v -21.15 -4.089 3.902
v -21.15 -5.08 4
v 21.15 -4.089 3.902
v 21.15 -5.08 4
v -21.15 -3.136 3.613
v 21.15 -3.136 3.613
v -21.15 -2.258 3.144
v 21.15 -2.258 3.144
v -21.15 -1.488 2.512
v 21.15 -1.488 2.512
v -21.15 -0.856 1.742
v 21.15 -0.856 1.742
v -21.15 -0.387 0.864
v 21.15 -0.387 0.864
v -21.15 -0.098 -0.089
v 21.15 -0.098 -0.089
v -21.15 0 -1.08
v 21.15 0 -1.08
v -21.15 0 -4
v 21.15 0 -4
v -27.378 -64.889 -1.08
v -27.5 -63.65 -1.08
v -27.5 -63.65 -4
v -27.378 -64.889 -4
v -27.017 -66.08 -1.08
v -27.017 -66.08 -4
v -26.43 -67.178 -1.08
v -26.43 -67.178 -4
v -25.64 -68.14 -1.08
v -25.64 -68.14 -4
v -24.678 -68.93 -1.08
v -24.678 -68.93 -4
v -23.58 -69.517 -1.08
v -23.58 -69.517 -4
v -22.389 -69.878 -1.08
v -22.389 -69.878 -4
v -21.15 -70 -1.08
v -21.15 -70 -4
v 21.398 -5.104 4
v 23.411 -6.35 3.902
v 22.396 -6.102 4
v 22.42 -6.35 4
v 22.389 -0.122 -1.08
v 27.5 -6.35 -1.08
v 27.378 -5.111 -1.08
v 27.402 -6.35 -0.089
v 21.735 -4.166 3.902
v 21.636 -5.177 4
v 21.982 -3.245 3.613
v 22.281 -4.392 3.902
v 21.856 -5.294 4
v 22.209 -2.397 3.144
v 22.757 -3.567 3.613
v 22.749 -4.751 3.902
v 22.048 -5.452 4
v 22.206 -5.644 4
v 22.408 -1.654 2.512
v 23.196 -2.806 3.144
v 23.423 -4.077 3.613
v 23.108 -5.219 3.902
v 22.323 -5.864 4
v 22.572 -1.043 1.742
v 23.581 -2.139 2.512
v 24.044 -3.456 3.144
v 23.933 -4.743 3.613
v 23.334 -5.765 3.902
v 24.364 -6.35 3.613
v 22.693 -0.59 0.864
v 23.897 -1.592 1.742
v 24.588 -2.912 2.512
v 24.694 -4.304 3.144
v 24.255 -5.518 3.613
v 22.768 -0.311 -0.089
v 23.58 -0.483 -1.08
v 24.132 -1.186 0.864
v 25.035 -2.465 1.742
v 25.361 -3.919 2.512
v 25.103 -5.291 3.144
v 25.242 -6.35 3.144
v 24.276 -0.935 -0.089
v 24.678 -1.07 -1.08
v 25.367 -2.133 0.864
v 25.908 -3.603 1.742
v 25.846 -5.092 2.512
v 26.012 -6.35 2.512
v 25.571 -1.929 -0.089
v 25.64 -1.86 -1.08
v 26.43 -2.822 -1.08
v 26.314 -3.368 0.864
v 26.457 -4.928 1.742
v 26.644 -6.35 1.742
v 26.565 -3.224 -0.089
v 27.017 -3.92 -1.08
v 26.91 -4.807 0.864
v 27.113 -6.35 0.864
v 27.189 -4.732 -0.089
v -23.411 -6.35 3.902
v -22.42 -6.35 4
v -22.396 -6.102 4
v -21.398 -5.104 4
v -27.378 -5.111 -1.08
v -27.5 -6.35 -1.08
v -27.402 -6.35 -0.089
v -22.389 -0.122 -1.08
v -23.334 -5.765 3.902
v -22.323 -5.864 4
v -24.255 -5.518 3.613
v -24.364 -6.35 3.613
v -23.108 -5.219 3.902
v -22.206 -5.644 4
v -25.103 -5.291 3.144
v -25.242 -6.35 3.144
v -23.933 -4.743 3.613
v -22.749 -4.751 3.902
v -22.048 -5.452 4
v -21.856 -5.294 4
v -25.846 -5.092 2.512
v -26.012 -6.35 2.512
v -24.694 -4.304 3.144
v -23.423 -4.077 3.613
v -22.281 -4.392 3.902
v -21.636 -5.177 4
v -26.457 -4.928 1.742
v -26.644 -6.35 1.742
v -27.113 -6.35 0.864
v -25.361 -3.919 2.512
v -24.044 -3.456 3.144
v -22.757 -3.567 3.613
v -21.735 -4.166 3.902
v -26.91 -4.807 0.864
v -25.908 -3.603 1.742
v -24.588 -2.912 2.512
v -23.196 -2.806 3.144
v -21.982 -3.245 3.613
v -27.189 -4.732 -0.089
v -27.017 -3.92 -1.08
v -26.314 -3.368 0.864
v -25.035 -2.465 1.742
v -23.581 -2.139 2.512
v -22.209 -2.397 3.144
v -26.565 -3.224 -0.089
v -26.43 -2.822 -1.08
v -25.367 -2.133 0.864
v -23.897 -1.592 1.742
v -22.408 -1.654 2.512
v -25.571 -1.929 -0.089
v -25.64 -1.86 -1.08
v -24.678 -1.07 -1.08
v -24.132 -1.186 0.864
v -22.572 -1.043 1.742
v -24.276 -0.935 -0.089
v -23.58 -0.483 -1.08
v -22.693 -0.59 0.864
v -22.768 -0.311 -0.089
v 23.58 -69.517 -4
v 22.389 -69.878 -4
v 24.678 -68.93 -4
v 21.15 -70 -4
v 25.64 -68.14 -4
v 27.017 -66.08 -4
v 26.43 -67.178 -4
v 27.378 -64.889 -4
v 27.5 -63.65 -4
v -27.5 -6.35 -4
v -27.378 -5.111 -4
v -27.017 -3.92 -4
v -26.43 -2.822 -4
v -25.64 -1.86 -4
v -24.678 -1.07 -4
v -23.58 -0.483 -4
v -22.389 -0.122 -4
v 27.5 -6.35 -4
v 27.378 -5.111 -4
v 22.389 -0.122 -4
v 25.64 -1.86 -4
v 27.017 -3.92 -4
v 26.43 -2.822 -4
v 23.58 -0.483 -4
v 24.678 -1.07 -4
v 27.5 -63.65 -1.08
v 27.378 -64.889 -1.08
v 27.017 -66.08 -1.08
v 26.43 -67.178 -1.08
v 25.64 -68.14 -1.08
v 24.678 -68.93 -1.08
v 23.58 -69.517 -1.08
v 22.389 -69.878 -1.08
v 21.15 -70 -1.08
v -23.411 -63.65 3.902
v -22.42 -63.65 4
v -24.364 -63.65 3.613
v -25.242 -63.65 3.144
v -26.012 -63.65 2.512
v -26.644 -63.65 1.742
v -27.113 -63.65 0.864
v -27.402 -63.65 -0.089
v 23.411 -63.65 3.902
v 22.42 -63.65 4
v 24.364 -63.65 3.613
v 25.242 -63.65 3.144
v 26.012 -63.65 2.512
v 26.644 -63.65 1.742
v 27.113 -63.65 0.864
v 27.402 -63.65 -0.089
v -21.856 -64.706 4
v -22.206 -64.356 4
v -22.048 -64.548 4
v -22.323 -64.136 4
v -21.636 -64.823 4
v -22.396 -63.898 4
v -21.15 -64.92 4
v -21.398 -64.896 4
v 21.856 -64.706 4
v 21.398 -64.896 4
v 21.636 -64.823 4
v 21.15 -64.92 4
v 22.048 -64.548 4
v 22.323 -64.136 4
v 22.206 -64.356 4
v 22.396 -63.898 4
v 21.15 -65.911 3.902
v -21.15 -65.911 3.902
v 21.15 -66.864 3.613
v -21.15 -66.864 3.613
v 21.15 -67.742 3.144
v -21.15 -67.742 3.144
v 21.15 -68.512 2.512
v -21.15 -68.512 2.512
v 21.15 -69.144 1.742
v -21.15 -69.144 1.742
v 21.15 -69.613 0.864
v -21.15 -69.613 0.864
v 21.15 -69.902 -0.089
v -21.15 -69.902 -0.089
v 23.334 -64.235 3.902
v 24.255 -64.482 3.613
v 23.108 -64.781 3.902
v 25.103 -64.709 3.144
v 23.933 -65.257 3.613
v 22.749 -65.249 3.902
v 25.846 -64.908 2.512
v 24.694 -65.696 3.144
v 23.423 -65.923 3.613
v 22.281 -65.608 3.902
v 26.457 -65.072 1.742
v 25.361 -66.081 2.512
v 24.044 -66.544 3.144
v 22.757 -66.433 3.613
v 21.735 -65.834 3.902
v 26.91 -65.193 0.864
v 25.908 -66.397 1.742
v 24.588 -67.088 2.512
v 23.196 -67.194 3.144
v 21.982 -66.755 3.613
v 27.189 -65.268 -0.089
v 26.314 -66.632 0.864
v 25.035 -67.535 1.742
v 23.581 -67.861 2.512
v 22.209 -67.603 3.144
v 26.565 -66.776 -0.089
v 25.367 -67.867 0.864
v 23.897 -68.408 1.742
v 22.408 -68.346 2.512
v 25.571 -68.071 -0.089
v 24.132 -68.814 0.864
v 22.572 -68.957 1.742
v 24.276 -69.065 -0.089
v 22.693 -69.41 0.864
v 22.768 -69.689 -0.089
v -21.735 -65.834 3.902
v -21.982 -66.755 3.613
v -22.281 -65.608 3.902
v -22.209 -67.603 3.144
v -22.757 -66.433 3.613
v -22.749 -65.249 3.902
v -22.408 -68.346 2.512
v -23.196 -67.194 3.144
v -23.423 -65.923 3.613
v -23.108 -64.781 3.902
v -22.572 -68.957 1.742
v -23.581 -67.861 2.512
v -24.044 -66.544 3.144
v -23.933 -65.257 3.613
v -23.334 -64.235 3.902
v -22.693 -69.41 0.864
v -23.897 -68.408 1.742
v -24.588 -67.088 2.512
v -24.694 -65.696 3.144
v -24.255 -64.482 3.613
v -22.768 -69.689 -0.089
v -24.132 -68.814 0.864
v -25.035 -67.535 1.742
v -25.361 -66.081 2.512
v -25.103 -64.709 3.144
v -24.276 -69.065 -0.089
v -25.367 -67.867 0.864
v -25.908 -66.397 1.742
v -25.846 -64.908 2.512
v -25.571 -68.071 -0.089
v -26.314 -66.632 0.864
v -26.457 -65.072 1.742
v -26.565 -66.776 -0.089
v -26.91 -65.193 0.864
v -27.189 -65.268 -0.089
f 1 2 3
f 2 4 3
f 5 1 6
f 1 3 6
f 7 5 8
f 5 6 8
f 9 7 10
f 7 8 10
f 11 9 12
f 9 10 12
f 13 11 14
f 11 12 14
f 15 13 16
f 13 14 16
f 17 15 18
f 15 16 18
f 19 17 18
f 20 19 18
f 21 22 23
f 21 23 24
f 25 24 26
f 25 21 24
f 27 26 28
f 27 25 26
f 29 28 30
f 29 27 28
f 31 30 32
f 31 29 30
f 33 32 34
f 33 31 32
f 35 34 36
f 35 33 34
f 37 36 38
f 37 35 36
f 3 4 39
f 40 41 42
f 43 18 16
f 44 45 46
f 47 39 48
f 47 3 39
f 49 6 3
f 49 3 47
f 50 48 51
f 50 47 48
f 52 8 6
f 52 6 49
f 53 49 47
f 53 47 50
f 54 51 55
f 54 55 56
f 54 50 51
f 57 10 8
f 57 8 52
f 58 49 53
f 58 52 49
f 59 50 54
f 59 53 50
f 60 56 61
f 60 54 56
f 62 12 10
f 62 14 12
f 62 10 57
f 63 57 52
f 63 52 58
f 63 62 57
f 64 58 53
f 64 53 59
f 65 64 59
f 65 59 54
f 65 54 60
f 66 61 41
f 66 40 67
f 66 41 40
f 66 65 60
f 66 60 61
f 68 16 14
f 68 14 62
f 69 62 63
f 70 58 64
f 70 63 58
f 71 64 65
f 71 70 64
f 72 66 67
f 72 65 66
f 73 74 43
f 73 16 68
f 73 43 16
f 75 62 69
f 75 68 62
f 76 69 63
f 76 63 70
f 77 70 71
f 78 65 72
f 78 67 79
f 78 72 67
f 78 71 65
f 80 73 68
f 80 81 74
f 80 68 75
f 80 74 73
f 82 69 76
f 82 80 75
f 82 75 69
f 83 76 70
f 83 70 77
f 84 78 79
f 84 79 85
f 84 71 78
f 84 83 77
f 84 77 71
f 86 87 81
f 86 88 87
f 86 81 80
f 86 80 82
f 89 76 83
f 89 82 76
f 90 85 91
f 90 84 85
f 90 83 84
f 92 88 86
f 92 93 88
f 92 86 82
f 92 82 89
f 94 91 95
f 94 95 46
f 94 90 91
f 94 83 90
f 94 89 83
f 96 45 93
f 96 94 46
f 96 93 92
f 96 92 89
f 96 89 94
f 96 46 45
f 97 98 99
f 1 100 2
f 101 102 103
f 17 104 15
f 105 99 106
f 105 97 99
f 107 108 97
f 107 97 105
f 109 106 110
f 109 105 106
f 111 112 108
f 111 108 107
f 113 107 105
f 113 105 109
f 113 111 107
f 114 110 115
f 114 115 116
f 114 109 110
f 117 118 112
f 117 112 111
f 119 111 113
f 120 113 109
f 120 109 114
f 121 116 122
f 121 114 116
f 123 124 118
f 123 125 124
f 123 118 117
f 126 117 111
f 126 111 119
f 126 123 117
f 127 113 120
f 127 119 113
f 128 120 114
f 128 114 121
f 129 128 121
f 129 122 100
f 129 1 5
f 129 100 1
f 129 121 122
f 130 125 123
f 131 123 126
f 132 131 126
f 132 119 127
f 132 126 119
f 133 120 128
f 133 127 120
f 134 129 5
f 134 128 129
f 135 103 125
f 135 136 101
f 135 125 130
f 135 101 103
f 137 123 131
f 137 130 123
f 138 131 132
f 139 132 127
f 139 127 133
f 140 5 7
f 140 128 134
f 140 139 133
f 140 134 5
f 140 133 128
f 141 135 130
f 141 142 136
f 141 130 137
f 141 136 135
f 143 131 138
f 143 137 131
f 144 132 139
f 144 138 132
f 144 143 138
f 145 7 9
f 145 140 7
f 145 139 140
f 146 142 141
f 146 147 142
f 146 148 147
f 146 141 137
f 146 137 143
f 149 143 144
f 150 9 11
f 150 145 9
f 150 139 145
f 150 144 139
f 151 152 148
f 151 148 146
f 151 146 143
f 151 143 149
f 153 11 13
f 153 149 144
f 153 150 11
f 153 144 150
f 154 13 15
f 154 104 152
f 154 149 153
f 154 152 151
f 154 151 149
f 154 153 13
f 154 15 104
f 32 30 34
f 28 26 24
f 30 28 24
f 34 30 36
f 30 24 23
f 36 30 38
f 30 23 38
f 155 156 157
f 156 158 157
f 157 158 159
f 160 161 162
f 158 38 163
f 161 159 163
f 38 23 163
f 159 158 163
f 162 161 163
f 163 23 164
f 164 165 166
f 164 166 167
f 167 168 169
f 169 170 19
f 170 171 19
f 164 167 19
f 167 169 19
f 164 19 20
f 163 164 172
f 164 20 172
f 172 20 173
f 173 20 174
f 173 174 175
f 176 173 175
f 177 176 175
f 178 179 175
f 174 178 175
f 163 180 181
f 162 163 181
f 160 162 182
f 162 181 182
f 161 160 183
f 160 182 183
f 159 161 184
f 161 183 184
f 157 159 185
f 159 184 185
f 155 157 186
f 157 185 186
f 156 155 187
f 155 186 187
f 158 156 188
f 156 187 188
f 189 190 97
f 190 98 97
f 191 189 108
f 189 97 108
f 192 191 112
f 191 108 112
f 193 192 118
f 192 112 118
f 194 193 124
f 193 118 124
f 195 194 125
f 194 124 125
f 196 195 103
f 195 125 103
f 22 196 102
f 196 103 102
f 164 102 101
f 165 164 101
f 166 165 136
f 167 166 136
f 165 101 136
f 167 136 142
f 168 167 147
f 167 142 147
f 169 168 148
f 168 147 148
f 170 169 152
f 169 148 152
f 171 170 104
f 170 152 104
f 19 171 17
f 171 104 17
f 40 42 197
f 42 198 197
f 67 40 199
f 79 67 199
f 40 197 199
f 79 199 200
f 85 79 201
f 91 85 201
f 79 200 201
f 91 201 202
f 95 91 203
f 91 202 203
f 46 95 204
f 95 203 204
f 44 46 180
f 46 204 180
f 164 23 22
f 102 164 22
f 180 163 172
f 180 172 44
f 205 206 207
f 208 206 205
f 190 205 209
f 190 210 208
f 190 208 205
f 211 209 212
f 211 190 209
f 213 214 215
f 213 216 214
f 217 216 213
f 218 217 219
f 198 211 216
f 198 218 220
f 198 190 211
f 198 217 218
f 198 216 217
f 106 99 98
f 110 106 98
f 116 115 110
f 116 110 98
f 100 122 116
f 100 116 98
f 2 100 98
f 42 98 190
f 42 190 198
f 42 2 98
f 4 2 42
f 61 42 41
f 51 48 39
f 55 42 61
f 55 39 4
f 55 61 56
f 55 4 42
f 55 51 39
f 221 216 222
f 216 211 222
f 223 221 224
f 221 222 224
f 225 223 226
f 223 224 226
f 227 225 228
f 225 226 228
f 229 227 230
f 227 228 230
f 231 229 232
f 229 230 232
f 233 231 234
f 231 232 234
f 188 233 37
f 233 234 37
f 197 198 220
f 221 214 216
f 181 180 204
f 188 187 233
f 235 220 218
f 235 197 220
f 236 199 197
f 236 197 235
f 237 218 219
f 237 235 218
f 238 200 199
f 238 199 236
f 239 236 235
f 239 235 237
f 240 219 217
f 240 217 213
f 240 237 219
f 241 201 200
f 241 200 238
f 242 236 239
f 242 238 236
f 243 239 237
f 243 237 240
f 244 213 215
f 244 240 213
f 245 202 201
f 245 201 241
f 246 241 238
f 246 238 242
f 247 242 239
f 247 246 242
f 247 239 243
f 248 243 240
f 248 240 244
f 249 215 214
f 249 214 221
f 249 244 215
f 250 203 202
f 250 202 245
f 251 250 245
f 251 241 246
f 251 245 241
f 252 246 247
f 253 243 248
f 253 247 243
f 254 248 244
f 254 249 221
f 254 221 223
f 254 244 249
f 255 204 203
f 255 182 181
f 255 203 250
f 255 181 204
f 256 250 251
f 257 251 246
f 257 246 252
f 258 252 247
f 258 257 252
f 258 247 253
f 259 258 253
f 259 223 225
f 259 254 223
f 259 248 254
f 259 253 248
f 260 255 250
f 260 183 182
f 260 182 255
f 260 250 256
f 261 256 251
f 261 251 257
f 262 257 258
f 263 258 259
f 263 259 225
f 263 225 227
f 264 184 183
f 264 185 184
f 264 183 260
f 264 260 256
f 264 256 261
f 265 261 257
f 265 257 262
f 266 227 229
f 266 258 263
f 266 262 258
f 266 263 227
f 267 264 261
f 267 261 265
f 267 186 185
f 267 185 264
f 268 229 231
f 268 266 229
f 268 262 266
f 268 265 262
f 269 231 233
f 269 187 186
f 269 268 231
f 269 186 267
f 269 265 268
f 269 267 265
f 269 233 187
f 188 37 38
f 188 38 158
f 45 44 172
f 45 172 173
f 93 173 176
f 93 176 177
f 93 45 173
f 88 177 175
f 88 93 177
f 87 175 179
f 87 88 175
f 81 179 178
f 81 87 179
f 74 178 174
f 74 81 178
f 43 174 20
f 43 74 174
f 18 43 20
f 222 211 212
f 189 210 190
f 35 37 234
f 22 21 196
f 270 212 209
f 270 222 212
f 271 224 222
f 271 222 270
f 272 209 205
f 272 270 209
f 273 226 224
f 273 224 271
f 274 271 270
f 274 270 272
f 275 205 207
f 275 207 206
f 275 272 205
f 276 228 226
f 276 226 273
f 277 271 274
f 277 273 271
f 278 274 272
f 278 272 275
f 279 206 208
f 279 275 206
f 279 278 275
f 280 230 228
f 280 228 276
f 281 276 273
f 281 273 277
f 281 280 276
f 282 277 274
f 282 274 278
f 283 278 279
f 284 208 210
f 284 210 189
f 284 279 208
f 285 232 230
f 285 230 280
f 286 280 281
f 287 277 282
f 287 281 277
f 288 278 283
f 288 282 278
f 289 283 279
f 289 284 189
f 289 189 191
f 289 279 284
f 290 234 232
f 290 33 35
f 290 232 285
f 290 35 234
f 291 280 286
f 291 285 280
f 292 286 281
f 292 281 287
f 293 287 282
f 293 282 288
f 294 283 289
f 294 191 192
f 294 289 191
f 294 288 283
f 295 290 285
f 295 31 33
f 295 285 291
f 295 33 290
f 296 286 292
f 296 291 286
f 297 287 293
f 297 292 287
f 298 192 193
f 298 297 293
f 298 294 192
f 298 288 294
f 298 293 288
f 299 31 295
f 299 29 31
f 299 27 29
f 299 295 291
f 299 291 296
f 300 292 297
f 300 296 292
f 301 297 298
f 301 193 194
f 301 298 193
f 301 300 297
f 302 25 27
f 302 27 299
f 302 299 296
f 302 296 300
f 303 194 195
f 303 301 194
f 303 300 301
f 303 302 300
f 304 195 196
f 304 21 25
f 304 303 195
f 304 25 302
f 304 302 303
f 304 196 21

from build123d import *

# Parameters (mm, degrees)
F0_W     = 55
F0_H     = 8
F1_DEPTH = 70
F2_R     = 6.35
F3_R     = 5.08


with BuildPart() as f1:
    # F0 (on Front) → F1 (new body)
    with BuildSketch(Plane.XZ):
        Rectangle(F0_W, F0_H)
    extrude(amount=F1_DEPTH)

    # F2
    f2_edges = [f1.edges().sort_by_distance(p)[0] for p in [
        (-27.5, -70, 0),
        (27.5, -70, 0),
        (27.5, 0, 0),
        (-27.5, 0, 0),
    ]]
    fillet(f2_edges, radius=F2_R)

    # F3
    f3_edges = [f1.edges().sort_by_distance(p)[0] for p in [
        (27.5, -35, 4),
        (25.640128, -1.859872, 4),
        (25.640128, -68.140128, 4),
        (0, 0, 4),
        (0, -70, 4),
        (-25.640128, -1.859872, 4),
        (-25.640128, -68.140128, 4),
        (-27.5, -35, 4),
    ]]
    fillet(f3_edges, radius=F3_R)


solid = f1.part
